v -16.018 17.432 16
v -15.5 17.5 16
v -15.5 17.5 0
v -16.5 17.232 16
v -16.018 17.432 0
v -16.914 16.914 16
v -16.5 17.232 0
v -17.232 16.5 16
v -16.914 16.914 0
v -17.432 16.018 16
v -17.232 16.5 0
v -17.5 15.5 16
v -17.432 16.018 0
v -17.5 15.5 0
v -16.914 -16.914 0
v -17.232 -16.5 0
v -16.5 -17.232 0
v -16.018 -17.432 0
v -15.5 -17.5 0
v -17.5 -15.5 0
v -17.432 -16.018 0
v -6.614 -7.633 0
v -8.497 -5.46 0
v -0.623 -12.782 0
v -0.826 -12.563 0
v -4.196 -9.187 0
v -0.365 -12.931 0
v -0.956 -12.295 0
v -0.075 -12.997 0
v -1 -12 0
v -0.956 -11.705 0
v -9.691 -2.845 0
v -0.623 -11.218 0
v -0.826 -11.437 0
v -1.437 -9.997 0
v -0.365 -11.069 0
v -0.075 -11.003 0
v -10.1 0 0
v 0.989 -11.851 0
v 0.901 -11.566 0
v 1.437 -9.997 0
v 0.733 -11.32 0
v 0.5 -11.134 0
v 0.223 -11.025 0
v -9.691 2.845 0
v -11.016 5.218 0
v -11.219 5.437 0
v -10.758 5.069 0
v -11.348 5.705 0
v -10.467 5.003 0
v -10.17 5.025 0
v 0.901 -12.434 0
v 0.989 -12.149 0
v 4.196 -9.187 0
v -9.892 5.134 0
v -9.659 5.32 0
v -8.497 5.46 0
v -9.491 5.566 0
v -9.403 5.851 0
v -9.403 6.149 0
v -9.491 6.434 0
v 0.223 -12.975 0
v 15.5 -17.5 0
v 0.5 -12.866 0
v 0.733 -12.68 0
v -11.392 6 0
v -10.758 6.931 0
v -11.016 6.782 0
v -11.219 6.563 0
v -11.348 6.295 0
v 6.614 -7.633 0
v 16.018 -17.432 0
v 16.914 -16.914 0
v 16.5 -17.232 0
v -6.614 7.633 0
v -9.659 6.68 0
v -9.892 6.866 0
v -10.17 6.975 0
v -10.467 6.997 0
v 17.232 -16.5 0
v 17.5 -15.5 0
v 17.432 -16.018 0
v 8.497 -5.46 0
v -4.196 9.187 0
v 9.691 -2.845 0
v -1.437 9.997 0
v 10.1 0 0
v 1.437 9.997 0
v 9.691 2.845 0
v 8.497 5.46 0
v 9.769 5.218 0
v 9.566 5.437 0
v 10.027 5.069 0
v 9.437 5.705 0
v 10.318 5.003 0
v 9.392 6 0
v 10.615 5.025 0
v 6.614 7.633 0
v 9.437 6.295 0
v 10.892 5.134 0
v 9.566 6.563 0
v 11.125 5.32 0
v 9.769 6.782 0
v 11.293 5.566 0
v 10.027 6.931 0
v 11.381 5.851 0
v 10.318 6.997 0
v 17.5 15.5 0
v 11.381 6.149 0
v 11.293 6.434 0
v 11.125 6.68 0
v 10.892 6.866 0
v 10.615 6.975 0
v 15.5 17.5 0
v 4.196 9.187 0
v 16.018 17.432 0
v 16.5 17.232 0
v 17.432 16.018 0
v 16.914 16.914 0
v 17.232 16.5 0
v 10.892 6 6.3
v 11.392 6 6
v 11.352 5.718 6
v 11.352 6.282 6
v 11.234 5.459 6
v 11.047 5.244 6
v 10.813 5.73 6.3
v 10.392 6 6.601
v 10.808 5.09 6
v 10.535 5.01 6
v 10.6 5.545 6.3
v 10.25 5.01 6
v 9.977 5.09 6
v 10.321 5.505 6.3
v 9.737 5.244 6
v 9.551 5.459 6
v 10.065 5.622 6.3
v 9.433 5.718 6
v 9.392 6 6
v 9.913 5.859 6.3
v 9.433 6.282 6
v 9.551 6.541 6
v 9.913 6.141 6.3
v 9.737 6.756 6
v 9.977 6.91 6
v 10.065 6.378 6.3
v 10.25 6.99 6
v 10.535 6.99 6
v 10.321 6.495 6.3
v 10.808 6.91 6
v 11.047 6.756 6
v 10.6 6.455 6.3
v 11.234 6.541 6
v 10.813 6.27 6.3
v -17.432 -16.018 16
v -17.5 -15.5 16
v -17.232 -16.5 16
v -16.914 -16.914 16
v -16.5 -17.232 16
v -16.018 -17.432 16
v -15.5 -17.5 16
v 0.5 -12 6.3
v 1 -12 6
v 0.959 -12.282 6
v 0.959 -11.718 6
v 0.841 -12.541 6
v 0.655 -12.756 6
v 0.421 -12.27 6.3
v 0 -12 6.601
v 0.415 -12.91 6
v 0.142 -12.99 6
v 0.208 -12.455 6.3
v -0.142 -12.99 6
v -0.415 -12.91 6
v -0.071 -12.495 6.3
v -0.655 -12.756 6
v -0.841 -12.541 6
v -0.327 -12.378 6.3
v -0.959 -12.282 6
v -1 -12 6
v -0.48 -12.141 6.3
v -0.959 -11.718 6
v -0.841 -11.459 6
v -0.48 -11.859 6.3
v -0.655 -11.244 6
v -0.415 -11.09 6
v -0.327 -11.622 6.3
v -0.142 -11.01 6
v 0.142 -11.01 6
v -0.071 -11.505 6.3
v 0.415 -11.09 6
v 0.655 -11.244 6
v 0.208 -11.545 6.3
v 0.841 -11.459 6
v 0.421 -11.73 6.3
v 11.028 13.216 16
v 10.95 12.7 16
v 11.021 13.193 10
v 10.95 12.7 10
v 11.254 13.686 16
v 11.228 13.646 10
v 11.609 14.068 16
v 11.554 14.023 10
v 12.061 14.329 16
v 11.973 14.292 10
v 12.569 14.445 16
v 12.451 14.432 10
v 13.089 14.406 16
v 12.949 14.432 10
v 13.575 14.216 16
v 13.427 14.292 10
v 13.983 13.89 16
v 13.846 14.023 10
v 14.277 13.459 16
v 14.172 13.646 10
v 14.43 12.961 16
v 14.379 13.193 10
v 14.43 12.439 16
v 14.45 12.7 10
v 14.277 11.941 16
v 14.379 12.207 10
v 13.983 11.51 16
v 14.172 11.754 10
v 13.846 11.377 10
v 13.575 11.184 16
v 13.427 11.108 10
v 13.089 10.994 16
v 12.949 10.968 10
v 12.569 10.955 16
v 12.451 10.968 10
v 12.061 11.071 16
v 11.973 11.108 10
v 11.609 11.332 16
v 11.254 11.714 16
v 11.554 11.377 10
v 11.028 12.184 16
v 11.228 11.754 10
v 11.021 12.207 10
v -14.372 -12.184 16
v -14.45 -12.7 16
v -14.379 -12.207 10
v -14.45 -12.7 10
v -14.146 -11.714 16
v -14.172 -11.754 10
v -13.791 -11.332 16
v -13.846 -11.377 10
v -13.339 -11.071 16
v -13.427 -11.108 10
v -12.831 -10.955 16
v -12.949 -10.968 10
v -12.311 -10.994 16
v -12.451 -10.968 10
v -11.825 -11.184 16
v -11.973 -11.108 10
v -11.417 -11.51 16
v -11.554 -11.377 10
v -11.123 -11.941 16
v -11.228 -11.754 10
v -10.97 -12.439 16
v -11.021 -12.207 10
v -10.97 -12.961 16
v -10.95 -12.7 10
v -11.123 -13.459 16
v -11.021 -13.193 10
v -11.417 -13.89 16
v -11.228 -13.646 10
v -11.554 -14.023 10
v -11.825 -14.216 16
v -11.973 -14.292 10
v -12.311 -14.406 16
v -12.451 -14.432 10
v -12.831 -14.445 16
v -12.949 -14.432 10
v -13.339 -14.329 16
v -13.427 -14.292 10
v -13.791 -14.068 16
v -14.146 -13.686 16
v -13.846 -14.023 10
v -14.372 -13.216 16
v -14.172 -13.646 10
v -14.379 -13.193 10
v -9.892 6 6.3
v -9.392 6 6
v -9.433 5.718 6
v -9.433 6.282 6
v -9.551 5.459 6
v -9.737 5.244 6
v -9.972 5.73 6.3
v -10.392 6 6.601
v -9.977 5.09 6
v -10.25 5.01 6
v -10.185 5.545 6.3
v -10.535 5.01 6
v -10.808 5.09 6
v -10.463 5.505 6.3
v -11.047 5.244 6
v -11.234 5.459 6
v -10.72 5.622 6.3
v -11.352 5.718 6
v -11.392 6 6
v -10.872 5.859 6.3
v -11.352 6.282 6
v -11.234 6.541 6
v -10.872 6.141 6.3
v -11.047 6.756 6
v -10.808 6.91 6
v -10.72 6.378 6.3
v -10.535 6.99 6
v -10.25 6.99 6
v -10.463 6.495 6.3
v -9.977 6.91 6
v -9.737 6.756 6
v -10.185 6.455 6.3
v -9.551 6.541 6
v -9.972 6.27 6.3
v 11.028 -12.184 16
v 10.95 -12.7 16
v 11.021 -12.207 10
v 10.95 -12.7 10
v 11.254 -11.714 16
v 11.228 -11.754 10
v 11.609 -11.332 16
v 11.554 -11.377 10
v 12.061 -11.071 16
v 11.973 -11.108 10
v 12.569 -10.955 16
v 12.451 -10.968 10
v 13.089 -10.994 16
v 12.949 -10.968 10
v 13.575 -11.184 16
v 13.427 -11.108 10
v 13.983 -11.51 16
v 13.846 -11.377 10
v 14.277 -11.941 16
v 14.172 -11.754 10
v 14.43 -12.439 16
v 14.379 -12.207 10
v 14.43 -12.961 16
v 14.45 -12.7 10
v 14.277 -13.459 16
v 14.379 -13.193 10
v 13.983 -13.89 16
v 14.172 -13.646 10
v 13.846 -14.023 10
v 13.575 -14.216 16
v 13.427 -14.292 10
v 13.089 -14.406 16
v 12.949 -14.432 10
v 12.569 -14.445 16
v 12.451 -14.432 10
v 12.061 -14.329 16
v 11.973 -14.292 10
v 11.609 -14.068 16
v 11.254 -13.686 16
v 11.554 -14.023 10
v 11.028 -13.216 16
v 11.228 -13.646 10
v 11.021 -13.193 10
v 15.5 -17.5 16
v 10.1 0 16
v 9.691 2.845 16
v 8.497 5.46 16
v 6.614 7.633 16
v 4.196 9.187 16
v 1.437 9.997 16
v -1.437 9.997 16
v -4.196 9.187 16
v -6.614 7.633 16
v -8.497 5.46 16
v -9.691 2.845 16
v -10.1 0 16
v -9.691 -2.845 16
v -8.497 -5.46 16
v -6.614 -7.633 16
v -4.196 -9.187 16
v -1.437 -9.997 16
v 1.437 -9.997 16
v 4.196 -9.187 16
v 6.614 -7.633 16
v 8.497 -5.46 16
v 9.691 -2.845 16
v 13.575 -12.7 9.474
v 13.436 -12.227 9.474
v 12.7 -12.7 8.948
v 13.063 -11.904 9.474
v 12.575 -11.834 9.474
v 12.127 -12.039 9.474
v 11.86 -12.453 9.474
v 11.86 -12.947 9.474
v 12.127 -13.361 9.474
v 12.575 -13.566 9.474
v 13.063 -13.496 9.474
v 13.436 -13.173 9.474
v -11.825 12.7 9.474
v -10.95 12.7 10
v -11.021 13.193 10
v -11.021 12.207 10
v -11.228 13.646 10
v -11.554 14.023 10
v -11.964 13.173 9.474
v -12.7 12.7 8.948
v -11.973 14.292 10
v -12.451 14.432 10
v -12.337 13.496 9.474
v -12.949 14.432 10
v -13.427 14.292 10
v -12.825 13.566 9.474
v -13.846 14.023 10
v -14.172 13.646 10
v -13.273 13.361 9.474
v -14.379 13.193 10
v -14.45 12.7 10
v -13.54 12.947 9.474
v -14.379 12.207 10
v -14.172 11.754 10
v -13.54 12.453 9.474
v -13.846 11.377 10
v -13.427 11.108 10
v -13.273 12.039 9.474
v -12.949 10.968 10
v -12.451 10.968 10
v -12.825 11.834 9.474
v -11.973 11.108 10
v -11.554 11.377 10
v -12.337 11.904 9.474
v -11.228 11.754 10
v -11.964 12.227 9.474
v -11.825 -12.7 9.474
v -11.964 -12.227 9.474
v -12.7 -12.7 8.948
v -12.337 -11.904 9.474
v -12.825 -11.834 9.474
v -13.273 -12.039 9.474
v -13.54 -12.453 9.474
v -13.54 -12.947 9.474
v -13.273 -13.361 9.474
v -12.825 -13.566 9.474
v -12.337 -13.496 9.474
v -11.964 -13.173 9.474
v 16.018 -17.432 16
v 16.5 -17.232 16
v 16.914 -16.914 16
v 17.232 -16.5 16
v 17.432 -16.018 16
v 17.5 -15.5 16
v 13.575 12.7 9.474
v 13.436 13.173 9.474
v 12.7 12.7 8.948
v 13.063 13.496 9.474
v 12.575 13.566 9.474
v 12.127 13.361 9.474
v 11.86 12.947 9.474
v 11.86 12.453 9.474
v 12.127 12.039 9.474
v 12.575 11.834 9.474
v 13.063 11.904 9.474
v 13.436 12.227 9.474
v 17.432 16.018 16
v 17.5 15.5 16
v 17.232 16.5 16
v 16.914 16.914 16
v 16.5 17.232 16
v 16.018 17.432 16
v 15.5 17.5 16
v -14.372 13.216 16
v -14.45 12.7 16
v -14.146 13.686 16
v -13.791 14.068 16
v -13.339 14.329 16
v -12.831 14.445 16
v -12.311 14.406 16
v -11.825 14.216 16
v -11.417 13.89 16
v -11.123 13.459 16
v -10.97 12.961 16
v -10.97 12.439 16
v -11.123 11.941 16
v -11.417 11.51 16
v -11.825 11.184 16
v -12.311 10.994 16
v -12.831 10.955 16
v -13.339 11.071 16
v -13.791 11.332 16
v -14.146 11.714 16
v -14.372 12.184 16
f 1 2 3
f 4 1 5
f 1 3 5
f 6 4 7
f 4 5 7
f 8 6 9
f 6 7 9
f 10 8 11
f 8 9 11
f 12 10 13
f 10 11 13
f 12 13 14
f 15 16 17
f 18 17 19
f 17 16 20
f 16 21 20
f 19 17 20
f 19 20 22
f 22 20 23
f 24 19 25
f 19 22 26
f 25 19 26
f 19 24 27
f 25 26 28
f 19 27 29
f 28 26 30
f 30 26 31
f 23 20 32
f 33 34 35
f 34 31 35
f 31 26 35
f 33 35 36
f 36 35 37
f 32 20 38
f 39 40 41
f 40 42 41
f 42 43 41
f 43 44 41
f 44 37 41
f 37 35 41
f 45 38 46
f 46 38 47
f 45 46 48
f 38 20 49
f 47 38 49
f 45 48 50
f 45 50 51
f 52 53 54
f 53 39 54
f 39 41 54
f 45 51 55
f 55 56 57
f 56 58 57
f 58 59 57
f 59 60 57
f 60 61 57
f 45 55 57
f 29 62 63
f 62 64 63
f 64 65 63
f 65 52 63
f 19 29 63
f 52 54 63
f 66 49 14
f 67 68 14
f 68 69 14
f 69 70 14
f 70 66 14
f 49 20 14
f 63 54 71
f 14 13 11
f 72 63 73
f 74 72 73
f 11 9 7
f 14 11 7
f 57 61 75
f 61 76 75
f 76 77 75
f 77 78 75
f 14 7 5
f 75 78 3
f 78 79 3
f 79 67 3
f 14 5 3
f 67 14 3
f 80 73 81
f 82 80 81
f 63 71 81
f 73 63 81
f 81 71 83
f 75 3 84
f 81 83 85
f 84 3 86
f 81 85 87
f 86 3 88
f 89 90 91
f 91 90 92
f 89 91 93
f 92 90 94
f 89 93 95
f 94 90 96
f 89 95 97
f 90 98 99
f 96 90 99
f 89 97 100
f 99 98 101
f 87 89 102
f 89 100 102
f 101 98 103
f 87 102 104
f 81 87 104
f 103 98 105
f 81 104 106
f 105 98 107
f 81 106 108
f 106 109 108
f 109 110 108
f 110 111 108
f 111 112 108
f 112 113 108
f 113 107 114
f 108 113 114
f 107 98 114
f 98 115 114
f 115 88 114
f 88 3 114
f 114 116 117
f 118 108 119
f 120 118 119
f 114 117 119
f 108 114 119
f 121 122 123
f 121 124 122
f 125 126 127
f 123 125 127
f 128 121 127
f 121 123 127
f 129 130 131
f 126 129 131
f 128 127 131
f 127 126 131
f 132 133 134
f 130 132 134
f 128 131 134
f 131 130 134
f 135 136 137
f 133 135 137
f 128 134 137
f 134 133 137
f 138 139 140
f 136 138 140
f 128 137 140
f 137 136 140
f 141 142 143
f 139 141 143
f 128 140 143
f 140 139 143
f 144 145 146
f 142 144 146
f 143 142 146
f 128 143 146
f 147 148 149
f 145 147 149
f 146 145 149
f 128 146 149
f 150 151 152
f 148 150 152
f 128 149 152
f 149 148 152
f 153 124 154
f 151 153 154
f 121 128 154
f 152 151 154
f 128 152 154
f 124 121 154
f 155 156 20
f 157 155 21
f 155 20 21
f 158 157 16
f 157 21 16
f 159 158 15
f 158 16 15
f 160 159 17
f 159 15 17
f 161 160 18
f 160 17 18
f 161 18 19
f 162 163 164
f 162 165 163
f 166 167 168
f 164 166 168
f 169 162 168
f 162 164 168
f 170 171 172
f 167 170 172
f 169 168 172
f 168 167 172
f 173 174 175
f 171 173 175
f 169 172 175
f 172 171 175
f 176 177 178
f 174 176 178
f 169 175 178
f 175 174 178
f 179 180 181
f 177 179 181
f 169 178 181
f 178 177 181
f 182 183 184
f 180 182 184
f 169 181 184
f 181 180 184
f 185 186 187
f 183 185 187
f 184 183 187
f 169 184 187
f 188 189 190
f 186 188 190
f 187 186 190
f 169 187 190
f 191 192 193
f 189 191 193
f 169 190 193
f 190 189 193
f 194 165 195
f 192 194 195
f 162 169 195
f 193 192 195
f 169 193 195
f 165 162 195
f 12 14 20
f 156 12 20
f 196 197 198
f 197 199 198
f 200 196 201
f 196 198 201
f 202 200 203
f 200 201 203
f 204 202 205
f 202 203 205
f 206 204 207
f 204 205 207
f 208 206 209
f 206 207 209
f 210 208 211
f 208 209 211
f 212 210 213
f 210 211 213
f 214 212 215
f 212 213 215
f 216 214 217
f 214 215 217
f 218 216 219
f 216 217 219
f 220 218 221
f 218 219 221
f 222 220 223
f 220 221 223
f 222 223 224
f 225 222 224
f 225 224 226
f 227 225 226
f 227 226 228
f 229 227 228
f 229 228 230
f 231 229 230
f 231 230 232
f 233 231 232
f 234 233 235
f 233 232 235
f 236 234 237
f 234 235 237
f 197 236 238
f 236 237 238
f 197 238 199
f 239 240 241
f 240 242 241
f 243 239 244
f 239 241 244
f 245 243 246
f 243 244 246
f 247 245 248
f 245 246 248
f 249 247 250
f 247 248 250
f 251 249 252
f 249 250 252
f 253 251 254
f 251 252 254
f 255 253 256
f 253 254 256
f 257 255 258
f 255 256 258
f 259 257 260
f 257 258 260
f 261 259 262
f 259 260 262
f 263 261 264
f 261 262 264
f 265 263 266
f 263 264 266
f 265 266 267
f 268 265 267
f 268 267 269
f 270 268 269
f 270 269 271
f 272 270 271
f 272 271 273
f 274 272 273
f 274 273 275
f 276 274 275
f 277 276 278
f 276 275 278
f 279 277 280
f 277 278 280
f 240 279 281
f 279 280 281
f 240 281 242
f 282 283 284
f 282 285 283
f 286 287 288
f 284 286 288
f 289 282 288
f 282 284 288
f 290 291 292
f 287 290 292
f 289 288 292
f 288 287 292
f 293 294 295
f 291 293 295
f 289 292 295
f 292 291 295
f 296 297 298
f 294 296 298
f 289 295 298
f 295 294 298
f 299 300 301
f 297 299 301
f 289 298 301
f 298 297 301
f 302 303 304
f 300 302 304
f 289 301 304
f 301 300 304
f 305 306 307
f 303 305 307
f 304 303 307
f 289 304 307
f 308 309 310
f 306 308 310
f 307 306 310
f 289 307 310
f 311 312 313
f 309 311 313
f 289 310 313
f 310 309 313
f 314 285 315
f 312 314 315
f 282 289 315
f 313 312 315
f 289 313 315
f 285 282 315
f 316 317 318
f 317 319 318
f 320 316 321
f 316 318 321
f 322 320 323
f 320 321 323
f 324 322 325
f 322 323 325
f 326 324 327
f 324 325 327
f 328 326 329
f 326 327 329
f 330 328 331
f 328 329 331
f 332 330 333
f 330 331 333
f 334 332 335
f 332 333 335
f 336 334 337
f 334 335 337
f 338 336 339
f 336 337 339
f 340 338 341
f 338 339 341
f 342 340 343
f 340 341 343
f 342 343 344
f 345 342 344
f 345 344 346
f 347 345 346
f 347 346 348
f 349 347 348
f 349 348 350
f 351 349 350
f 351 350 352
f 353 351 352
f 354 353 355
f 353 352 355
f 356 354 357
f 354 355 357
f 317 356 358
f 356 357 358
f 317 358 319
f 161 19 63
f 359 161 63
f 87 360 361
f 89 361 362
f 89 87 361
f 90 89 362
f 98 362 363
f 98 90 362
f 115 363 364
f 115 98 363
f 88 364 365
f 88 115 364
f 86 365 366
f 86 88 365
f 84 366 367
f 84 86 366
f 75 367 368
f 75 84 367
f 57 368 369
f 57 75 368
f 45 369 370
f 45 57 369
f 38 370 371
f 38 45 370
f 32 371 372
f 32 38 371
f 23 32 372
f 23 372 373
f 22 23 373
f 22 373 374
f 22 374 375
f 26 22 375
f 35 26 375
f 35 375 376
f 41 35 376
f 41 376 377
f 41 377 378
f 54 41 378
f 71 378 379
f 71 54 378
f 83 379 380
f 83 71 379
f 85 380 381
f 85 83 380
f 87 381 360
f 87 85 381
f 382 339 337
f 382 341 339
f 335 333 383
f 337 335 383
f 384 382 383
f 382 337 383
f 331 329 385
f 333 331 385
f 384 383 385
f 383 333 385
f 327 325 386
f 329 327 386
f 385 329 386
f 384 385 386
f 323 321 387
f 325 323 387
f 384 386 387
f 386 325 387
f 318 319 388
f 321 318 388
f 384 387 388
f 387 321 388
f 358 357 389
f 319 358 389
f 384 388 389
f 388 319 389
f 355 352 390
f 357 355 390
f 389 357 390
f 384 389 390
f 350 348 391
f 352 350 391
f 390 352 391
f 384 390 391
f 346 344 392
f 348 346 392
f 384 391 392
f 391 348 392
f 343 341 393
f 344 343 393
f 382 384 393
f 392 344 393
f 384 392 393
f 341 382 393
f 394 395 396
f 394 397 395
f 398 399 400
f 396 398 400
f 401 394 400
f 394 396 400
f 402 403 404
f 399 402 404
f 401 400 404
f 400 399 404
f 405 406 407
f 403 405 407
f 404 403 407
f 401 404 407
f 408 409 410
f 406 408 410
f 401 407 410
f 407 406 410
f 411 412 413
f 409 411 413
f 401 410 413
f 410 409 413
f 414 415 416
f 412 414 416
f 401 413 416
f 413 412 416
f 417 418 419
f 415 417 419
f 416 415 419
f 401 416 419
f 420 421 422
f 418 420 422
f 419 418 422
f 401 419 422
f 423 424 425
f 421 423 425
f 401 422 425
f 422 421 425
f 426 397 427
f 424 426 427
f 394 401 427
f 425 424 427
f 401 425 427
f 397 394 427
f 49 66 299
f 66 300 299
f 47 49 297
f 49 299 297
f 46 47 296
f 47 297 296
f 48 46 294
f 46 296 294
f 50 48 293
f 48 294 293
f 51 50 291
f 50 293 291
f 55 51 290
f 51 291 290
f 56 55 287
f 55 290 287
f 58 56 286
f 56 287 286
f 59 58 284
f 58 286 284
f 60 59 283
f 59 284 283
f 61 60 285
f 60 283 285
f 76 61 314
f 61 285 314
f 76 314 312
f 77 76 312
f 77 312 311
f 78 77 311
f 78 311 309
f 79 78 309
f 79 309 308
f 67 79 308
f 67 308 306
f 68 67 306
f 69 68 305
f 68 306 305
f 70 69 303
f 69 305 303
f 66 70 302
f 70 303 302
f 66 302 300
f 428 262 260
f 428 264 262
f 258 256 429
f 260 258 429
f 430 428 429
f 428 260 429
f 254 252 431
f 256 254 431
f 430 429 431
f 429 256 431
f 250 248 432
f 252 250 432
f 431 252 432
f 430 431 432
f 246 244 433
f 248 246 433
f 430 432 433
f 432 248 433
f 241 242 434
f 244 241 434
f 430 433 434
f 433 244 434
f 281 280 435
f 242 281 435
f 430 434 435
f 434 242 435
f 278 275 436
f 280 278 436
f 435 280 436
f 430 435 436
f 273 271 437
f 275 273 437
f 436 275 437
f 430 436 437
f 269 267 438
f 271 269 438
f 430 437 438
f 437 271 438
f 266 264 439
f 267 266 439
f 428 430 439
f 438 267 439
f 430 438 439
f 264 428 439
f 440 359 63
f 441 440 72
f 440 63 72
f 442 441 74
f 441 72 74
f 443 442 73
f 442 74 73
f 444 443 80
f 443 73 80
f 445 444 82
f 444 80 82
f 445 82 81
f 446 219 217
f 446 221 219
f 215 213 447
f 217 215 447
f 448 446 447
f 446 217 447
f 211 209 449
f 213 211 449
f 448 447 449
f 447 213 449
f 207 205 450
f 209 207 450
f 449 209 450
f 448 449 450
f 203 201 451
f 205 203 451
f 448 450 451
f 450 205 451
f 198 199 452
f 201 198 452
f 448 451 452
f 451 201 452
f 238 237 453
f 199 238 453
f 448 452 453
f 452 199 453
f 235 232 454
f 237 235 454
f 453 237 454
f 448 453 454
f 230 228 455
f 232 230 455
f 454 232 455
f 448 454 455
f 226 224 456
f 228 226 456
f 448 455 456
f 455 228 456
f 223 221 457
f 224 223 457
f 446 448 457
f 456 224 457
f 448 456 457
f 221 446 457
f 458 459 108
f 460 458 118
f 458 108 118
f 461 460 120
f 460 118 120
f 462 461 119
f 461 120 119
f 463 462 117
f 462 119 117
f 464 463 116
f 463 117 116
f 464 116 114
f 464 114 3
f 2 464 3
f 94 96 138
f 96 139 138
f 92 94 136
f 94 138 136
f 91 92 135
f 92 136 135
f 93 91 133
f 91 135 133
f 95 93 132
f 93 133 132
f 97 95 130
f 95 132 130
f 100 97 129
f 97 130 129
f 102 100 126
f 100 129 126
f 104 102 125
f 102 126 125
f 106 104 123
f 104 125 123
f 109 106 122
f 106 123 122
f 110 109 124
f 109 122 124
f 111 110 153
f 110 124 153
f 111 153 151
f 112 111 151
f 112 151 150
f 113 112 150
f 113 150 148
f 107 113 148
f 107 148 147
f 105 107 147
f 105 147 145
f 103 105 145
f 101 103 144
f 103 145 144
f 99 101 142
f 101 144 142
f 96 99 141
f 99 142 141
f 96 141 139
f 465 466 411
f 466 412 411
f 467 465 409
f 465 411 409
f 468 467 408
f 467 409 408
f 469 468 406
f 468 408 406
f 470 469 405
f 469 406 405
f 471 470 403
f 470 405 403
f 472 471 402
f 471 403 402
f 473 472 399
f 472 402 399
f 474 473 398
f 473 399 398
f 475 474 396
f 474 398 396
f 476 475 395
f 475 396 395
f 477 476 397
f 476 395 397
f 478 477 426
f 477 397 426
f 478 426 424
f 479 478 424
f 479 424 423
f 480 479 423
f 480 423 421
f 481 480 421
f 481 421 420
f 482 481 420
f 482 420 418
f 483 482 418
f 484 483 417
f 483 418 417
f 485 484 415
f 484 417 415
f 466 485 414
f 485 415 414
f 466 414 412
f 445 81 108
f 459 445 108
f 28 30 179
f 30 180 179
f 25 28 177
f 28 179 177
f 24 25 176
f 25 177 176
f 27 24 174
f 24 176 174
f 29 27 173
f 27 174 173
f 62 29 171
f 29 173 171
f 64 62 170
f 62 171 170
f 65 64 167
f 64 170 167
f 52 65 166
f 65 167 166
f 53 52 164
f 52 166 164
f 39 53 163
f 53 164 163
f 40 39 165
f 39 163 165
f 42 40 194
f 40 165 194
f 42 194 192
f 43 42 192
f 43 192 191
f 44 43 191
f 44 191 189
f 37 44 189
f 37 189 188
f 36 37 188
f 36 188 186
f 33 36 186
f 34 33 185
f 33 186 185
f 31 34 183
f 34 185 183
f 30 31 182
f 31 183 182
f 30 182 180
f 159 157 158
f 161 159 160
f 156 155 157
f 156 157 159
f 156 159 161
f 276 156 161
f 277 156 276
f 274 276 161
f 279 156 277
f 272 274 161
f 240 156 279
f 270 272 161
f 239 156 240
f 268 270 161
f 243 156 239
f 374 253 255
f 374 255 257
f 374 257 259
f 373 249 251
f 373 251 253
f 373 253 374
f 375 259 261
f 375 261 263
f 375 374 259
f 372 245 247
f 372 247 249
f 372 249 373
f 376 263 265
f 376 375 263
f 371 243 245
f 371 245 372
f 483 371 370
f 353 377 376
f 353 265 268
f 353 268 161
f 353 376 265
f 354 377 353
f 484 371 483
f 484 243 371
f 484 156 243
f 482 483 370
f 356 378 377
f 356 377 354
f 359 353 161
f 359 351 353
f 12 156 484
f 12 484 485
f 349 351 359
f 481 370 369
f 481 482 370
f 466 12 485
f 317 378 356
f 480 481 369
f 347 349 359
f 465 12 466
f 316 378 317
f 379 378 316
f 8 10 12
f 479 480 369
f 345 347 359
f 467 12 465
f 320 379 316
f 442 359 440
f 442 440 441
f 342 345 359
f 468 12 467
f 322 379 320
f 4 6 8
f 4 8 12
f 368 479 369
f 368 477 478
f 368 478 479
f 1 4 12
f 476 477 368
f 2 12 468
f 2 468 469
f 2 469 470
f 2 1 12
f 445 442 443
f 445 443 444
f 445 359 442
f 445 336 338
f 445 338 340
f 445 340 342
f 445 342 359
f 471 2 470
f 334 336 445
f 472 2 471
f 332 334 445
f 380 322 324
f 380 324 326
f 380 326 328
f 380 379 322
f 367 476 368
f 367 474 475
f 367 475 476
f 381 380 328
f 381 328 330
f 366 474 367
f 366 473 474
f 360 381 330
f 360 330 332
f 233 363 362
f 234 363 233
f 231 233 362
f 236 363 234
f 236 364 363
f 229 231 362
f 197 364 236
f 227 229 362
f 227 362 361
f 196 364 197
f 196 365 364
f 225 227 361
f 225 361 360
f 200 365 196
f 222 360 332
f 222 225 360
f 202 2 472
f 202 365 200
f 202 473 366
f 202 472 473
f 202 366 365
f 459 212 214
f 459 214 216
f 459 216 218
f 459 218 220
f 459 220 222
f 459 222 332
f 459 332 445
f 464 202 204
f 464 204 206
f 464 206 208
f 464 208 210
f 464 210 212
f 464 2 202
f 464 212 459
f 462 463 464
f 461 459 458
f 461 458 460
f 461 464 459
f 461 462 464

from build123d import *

# Parameters (mm, degrees)
F0_R     = 10.1
F1_DEPTH = 16
F3_D     = 3.5
F3_DEPTH = 6
F3_TIP   = 1.0515060833
F5_D     = 2
F5_DEPTH = 6
F5_TIP   = 0.600860619


with BuildPart() as f1:
    # F0 (on Top) → F1 (new body)
    with BuildSketch(Plane.XY):
        with BuildLine():
            Line((-15.5, -17.5), (15.5, -17.5))
            ThreePointArc((15.5, -17.5), (16.9142135624, -16.9142135624), (17.5, -15.5))
            Line((17.5, -15.5), (17.5, 15.5))
            ThreePointArc((17.5, 15.5), (16.9142135624, 16.9142135624), (15.5, 17.5))
            Line((15.5, 17.5), (-15.5, 17.5))
            ThreePointArc((-15.5, 17.5), (-16.9142135624, 16.9142135624), (-17.5, 15.5))
            Line((-17.5, 15.5), (-17.5, -15.5))
            ThreePointArc((-17.5, -15.5), (-16.9142135624, -16.9142135624), (-15.5, -17.5))
        make_face()
        Circle(F0_R, mode=Mode.SUBTRACT)
    extrude(amount=F1_DEPTH)

    # F3
    with Locations(Plane.XY.offset(16)):
        with Locations((-12.7, 12.7), (12.7, 12.7), (12.7, -12.7), (-12.7, -12.7)):
            Hole(F3_D / 2, depth=F3_DEPTH)
            with Locations((0, 0, -(F3_DEPTH + F3_TIP / 2))):  # 118° drill point
                Cone(0, F3_D / 2, F3_TIP, mode=Mode.SUBTRACT)

    # F5
    with Locations(Plane(origin=(0, 0, 0), x_dir=(1, 0, 0), z_dir=(0, 0, -1))):
        with Locations((0, 12), (10.3923048454, -6), (-10.3923048454, -6)):
            Hole(F5_D / 2, depth=F5_DEPTH)
            with Locations((0, 0, -(F5_DEPTH + F5_TIP / 2))):  # 118° drill point
                Cone(0, F5_D / 2, F5_TIP, mode=Mode.SUBTRACT)


solid = f1.part
